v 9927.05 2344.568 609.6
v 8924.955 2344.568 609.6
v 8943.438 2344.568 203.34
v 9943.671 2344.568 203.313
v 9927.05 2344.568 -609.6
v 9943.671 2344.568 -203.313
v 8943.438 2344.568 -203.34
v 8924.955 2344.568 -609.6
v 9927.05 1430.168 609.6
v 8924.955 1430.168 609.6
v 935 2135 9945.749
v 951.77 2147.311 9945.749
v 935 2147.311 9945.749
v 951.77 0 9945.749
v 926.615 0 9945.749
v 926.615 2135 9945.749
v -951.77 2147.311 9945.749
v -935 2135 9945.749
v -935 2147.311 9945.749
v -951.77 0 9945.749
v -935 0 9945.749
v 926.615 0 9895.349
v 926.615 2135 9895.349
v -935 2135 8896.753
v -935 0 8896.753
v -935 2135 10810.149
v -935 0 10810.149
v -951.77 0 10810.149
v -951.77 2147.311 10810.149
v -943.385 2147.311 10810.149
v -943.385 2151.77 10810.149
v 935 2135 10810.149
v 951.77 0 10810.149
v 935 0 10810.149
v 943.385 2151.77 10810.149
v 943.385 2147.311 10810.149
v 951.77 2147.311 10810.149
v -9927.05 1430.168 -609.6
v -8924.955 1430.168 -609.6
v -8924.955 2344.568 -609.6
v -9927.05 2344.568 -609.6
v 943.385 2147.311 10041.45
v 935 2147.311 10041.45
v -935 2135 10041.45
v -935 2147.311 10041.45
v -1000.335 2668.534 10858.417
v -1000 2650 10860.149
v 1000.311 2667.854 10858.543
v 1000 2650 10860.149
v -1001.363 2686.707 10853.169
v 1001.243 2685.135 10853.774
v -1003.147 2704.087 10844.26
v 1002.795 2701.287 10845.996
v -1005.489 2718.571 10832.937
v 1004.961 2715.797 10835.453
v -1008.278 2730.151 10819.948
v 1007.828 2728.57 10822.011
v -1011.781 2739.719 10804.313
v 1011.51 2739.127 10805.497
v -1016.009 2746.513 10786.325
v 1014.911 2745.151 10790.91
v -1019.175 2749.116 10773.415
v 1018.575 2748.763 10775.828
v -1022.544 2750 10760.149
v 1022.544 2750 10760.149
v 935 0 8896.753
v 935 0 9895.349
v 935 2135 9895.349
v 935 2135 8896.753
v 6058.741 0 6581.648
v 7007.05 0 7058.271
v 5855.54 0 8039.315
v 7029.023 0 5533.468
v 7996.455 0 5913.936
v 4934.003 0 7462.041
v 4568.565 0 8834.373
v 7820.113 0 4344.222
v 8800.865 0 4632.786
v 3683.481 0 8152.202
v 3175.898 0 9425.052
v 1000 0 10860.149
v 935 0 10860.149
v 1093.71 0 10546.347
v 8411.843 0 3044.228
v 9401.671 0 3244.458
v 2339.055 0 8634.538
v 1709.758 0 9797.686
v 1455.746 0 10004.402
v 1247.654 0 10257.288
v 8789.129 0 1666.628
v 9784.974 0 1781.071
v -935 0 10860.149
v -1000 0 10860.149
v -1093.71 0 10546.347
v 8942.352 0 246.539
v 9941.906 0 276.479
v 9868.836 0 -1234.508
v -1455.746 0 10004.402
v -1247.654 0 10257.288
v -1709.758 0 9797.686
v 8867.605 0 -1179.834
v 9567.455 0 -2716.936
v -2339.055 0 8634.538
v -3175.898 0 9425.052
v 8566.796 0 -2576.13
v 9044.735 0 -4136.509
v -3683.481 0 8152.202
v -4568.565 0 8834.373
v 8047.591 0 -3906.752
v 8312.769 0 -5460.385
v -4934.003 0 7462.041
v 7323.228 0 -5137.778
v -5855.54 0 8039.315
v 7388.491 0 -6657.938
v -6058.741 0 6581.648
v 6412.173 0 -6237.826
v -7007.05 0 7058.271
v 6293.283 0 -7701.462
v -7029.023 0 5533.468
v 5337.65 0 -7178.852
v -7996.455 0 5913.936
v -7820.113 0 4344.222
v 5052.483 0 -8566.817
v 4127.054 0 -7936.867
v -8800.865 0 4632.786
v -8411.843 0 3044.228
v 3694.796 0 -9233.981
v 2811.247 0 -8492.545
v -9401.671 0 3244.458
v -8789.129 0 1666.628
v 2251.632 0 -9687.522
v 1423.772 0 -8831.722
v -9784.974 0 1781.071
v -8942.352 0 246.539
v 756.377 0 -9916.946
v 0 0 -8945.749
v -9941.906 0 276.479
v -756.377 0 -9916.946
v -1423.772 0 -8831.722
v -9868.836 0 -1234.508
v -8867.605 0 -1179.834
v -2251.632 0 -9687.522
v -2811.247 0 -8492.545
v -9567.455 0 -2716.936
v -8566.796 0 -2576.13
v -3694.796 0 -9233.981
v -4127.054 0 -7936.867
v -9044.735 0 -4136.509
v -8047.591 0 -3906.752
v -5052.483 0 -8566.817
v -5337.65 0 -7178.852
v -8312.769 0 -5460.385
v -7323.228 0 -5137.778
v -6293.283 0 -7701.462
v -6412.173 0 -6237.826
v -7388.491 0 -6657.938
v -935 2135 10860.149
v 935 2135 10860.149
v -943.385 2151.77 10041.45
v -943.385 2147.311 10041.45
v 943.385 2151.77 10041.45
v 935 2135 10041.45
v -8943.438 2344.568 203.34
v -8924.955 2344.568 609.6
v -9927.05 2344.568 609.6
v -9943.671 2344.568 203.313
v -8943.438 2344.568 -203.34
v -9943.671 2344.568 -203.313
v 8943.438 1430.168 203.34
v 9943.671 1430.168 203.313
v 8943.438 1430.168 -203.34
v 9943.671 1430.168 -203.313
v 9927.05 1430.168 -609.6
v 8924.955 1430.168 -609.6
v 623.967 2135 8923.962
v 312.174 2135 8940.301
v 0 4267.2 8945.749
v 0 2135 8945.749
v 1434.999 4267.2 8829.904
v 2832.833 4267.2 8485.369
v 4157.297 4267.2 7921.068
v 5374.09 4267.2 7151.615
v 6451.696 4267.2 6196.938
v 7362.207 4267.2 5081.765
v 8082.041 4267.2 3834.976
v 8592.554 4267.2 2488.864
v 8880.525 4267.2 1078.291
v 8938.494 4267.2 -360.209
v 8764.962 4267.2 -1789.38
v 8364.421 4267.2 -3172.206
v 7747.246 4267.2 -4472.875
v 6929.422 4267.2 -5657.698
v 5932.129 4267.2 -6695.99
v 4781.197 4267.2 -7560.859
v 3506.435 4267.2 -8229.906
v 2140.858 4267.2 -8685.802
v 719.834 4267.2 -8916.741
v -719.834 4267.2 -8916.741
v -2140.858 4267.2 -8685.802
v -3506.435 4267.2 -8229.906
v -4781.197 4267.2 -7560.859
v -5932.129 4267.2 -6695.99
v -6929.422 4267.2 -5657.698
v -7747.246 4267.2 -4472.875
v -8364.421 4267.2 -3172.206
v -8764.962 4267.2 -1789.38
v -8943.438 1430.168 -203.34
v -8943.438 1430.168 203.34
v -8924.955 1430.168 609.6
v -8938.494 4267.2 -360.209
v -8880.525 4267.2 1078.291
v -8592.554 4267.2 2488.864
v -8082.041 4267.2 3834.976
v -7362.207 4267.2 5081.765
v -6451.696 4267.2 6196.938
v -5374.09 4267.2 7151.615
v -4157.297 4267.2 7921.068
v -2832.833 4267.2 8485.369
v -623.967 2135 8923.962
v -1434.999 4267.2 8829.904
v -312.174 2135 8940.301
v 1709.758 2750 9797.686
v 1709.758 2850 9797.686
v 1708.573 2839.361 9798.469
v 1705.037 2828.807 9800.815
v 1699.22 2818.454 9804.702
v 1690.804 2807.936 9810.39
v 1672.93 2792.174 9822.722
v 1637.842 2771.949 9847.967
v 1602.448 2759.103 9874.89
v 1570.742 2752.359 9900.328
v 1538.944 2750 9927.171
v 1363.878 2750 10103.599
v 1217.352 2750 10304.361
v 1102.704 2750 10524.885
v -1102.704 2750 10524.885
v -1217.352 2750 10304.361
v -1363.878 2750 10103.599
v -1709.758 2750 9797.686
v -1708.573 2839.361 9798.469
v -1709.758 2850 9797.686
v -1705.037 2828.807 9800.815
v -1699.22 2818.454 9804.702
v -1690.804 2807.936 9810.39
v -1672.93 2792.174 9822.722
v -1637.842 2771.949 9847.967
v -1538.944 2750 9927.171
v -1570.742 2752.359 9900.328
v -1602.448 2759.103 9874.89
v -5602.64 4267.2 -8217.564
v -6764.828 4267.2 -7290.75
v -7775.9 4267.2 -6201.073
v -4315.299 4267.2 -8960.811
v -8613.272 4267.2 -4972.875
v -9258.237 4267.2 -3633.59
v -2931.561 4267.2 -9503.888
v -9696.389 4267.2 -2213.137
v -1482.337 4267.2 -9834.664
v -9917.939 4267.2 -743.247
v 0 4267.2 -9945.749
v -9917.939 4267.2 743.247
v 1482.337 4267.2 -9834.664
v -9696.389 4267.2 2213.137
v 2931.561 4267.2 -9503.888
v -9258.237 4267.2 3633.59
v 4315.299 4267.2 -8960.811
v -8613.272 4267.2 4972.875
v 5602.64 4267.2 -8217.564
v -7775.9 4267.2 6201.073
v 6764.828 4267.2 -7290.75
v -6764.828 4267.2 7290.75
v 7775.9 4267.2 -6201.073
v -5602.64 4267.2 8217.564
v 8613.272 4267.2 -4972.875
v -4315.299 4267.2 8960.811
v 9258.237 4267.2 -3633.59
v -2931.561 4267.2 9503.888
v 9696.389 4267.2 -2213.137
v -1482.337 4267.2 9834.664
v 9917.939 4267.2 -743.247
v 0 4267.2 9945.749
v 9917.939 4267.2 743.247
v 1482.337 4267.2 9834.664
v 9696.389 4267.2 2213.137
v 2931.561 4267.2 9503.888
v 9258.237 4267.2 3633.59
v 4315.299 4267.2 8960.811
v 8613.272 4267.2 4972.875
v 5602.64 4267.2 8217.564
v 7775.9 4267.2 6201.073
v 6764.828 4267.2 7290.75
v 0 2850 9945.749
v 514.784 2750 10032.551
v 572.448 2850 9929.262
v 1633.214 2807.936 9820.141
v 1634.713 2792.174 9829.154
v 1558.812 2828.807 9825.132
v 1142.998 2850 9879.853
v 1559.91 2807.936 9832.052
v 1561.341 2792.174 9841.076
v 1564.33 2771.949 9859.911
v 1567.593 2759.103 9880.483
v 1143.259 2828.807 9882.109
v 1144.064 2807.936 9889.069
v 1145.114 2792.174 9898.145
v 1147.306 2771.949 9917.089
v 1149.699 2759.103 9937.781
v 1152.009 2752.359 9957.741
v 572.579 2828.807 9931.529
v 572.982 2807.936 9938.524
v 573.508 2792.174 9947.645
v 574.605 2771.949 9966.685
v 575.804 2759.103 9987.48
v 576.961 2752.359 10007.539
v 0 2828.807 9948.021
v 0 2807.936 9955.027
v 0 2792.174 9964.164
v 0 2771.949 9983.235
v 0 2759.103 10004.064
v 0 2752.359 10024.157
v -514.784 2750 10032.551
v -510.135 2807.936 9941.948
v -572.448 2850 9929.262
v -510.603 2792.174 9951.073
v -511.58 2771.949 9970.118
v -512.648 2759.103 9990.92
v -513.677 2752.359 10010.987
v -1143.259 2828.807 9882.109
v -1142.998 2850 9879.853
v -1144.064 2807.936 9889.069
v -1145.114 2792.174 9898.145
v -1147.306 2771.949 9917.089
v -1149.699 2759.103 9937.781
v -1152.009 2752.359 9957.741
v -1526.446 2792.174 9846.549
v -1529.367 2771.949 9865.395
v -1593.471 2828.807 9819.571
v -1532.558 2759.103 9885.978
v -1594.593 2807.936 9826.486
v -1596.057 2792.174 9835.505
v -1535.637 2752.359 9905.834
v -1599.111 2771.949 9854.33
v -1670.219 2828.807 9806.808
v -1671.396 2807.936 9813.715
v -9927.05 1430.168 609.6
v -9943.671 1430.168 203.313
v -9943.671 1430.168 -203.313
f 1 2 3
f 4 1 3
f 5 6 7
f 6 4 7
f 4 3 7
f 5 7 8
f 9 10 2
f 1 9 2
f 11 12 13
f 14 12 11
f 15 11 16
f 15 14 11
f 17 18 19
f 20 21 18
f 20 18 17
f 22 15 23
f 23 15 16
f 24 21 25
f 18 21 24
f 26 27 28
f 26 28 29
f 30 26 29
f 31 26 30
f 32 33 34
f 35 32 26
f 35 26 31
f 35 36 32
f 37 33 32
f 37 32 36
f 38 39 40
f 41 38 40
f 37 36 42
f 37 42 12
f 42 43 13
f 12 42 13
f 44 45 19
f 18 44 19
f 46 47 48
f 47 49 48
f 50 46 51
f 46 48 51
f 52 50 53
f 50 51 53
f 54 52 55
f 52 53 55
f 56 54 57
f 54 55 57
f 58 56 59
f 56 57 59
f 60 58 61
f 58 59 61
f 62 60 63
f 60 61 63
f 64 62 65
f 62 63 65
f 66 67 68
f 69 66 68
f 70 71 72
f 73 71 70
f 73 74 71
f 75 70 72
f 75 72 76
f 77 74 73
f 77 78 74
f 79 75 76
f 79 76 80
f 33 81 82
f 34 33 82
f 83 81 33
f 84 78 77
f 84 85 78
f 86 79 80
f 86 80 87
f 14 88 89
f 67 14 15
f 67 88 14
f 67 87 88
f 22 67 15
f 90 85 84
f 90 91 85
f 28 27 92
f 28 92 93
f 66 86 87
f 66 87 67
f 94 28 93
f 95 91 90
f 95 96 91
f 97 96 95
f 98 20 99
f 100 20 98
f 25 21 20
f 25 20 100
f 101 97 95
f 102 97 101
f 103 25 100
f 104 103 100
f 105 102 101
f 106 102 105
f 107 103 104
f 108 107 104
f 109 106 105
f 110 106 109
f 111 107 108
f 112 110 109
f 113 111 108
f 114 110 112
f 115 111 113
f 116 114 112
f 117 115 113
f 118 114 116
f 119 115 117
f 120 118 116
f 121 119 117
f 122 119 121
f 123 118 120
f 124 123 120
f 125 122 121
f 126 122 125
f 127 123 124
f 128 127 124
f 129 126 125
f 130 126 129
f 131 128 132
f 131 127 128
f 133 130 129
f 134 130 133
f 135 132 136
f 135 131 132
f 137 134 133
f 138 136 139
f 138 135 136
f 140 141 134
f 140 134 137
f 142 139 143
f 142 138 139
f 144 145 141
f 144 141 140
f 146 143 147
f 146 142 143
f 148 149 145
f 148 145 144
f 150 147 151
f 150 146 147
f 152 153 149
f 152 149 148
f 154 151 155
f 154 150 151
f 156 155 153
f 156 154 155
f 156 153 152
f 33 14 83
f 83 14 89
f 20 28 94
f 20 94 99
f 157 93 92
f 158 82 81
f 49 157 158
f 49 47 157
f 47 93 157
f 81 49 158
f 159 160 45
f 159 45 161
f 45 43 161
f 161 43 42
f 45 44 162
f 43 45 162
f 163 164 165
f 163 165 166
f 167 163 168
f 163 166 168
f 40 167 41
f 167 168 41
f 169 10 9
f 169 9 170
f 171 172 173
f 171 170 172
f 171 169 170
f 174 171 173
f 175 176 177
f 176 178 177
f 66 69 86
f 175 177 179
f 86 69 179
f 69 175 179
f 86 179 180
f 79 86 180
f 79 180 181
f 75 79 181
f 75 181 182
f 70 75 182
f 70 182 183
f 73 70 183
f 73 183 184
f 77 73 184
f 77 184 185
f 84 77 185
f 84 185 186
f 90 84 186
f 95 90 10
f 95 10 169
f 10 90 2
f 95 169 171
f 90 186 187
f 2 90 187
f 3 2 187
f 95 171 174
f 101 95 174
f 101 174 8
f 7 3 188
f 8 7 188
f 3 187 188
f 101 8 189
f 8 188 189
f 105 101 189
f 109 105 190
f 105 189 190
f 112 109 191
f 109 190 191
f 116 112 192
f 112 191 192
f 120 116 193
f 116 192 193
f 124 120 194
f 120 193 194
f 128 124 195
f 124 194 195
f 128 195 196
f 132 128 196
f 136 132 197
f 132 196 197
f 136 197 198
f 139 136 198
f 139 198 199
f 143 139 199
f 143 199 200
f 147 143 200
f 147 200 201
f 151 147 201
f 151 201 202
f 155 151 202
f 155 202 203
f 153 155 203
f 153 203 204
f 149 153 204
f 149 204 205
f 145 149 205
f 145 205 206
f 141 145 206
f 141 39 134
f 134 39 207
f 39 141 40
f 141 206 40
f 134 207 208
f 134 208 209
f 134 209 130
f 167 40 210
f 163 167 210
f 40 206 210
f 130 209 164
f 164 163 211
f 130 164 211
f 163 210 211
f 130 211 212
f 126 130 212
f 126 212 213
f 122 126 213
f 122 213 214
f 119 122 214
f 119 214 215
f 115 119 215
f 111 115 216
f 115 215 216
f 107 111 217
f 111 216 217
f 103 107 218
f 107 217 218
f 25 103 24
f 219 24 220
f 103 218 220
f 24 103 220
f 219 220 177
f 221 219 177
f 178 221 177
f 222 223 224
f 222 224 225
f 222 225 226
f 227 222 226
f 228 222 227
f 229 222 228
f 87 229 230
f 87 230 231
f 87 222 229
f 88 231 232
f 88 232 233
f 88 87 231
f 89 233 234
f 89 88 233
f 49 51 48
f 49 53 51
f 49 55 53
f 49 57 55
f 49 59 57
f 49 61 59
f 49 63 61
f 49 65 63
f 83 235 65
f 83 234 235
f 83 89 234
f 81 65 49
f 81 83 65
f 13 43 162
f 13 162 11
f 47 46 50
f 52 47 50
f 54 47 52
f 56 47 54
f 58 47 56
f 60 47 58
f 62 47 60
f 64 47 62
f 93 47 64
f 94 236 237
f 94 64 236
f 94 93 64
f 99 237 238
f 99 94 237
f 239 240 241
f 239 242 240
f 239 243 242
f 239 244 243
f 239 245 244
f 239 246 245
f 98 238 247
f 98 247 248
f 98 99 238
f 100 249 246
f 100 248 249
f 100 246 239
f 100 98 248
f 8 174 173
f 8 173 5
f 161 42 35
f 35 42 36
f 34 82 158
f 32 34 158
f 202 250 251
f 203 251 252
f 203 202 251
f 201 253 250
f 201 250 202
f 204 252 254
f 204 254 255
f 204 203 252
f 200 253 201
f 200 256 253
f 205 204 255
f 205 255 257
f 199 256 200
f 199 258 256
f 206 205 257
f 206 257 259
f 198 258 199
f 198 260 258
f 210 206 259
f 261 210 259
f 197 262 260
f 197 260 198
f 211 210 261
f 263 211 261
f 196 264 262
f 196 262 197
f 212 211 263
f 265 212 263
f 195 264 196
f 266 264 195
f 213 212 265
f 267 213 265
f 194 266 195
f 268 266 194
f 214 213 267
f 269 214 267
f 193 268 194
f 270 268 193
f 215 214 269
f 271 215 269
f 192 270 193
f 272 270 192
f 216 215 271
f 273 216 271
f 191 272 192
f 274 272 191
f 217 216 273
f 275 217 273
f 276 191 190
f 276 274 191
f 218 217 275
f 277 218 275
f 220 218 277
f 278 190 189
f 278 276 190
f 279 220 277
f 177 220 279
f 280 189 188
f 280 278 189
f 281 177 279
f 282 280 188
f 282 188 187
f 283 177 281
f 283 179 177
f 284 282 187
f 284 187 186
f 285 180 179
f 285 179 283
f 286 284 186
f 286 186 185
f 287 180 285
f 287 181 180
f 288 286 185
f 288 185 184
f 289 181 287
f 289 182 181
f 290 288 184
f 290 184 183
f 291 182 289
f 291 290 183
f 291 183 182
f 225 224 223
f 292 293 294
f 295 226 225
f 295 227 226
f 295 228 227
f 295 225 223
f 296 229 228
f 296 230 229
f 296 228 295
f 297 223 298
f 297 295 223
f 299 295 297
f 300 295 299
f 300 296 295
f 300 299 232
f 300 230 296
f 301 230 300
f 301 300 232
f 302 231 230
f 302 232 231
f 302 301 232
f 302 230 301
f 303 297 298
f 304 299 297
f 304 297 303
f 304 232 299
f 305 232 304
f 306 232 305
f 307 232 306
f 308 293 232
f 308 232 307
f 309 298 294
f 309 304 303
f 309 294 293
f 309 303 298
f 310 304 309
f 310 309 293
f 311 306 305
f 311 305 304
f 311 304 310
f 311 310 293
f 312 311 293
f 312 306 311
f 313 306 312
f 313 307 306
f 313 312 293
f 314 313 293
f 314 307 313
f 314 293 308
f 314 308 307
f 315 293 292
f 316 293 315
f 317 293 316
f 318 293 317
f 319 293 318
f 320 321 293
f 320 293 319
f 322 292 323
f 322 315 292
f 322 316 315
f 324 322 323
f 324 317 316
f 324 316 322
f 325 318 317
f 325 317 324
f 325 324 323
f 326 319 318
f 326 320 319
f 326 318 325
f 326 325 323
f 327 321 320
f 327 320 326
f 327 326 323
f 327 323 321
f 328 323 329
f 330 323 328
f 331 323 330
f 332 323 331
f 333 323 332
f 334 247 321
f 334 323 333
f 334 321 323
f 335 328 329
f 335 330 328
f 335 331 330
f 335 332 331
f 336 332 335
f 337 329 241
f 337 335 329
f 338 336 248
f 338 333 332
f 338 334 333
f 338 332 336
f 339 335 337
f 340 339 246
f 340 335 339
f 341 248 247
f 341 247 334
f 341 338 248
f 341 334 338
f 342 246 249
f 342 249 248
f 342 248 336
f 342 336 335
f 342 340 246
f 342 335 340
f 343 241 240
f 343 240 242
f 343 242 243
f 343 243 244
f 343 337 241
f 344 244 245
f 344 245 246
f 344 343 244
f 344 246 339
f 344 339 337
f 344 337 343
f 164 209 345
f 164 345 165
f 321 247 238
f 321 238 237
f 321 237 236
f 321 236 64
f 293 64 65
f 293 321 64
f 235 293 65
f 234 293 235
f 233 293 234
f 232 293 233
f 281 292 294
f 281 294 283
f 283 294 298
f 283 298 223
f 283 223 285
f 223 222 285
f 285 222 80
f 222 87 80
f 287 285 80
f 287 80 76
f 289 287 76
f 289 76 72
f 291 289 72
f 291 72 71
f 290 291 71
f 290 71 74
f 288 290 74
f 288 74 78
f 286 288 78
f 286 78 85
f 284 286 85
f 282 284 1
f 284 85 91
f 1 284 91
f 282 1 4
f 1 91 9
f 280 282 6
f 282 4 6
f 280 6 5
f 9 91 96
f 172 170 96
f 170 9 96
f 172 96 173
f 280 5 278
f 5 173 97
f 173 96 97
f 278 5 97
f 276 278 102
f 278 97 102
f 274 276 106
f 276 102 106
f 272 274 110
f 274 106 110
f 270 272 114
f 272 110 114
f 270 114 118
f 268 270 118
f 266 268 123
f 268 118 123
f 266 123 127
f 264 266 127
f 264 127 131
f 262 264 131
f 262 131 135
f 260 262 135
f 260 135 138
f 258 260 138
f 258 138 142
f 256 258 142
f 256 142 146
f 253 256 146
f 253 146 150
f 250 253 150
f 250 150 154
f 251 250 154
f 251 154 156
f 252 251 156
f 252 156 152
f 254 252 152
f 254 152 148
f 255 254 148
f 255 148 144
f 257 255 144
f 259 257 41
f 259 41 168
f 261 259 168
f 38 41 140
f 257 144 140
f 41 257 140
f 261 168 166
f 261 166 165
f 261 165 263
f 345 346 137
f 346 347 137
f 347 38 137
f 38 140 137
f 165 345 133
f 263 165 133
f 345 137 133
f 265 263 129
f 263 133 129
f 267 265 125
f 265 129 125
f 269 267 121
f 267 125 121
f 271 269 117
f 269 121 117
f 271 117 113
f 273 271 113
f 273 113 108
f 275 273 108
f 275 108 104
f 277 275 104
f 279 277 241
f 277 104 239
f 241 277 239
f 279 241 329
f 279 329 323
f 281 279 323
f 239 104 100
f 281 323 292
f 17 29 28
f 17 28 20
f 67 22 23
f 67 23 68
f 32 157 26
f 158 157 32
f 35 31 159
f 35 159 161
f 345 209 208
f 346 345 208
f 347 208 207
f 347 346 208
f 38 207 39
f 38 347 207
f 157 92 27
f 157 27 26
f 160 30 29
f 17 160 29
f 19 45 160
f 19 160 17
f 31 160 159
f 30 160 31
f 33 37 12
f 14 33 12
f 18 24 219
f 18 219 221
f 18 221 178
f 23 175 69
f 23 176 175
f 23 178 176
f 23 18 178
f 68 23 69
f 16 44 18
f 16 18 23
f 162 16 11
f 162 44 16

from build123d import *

# Parameters (mm, degrees)
SKETCH1_R               = 9945.749426531
BOSS_EXTRUDE1_DEPTH     = 4267.2
SKETCH2_R               = 8945.749426531
CUT_EXTRUDE1_DEPTH      = 4267.2
SKETCH4_W               = 2000
SKETCH4_H               = 2750
BOSS_EXTRUDE2_DEPTH     = 914.4
SKETCH5_W               = 1870
SKETCH5_H               = 2135
CUT_EXTRUDE2_DEPTH      = 2500
SKETCH6_W               = 864.4
SKETCH6_H               = 2222.798404513
CUT_EXTRUDE3_DEPTH      = 16.77
SKETCH7_W               = 1886.77
SKETCH7_H               = 768.69921335
CUT_EXTRUDE4_DEPTH      = 16.77
BOSS_EXTRUDE3_REACH     = 15333.985
SKETCH9_W               = 1861.615
SKETCH9_H               = 2276.741712896
CUT_EXTRUDE5_DEPTH      = 4000
CUT_EXTRUDE6_DEPTH      = 15332.985294212
CUT_EXTRUDE6_DEPTH_BACK = 15332.985294212
SKETCH10_W              = 1219.2
SKETCH10_H              = 914.4
FILLET1_R               = 100


with BuildPart() as part:
    # Sketch1 → Boss-Extrude1 (new body)
    with BuildSketch(Plane(origin=(0, 0, 0), x_dir=(1, 0, 0), z_dir=(0, 1, 0))):
        with Locations(Location((0, 0, 0), (0, 0, 270))):
            Circle(SKETCH1_R)
    extrude(amount=BOSS_EXTRUDE1_DEPTH)

    # Sketch2 → Cut-Extrude1 (cut)
    with BuildSketch(Plane(origin=(0, 4267.2, 0), x_dir=(1, 0, 0), z_dir=(0, 1, 0))):
        with Locations(Location((0, 0, 0), (0, 0, 270))):
            Circle(SKETCH2_R)
    extrude(amount=-CUT_EXTRUDE1_DEPTH, mode=Mode.SUBTRACT)


with BuildPart() as body_2:
    # Sketch4 → Boss-Extrude2 (new body)
    with BuildSketch(Plane.XY.offset(9945.749426531)):
        with Locations((0, 1375)):
            Rectangle(SKETCH4_W, SKETCH4_H)
    extrude(amount=BOSS_EXTRUDE2_DEPTH)


with BuildPart() as cut_extrude2_tool:
    # Sketch5 → Cut-Extrude2 (new, symmetric)
    with BuildSketch(Plane.XY.offset(10860.149426531)):
        with Locations((0, 1067.5)):
            Rectangle(SKETCH5_W, SKETCH5_H)
    extrude(amount=CUT_EXTRUDE2_DEPTH, both=True)


with BuildPart() as part_1:
    add(part.part)

    # Cut-Extrude2: cut by cut_extrude2_tool
    add(cut_extrude2_tool.part, mode=Mode.SUBTRACT)


with BuildPart() as body_2_1:
    add(body_2.part)

    # Cut-Extrude2: cut by cut_extrude2_tool
    add(cut_extrude2_tool.part, mode=Mode.SUBTRACT)

    # Sketch6 → Cut-Extrude3 (cut)
    with BuildSketch(Plane(origin=(-935, 0, 0), x_dir=(0, 0, -1), z_dir=(1, 0, 0))):
        with Locations((-10377.949426531, 1035.912288571)):
            Rectangle(SKETCH6_W, SKETCH6_H)
    cut_extrude3 = extrude(amount=-CUT_EXTRUDE3_DEPTH, mode=Mode.SUBTRACT)

    # Mirror1: Cut-Extrude3 across plane
    add(cut_extrude3.mirror(Plane(origin=(0, 0, 0), x_dir=(0, 0, 1), z_dir=(1, 0, 0))), mode=Mode.SUBTRACT)

    # Sketch7 → Cut-Extrude4 (cut)
    with BuildSketch(Plane.XZ.offset(-2135)):
        with Locations((0, 10425.799819856)):
            Rectangle(SKETCH7_W, SKETCH7_H)
    extrude(amount=-CUT_EXTRUDE4_DEPTH, mode=Mode.SUBTRACT)

    # Boss-Extrude3: up to this face of the body (flat: up to its plane)
    boss_extrude3_end = Plane(body_2_1.part.faces().sort_by_distance((0, 2750, 10402.949426531))[0])
    # Sketch8 → Boss-Extrude3 (add, up to the picked face)
    with BuildSketch(Plane(origin=(0, 0, 0), x_dir=(1, 0, 0), z_dir=(0, 1, 0)), mode=Mode.PRIVATE) as boss_extrude3_sk1:
        with BuildLine():
            Line((-1000, -9945.749426531), (-1000, -10860.149426531))
            ThreePointArc((-1000, -10860.149426531), (-1247.653940118, -10257.288387991), (-1709.757794535, -9797.686458515))
            ThreePointArc((-1709.757794535, -9797.686458515), (-1355.758576896, -9852.910754519), (-1000, -9895.348991084))
            Line((-1000, -9895.348991084), (1000, -9895.348991084))
            ThreePointArc((1000, -9895.348991084), (1355.758576896, -9852.910754519), (1709.757794535, -9797.686458515))
            ThreePointArc((1709.757794535, -9797.686458515), (1247.653940118, -10257.288387991), (1000, -10860.149426531))
            Line((1000, -10860.149426531), (1000, -9945.749426531))
            Line((1000, -9945.749426531), (-1000, -9945.749426531))
        make_face()
    boss_extrude3_tool1 = split(extrude(boss_extrude3_sk1.sketch, amount=BOSS_EXTRUDE3_REACH, mode=Mode.PRIVATE), bisect_by=boss_extrude3_end, keep=Keep.BOTH, mode=Mode.PRIVATE)

    add(part_1.part)  # Boss-Extrude3 merges part
    add(boss_extrude3_tool1.solids().sort_by(Axis((1035.807701, 0, 10402.949427), (0, 1, 0)))[0])

    # Sketch9 → Cut-Extrude5 (cut)
    with BuildSketch(Plane.XY.offset(9945.749426531)):
        with Locations((-4.1925, 996.629143552)):
            Rectangle(SKETCH9_W, SKETCH9_H)
    extrude(amount=-CUT_EXTRUDE5_DEPTH, mode=Mode.SUBTRACT)

    # Sketch10 → Cut-Extrude6 (cut, two sides: drawn at the far end of the back side and taken through both)
    with BuildSketch(Plane(origin=(0, 0, 0), x_dir=(0, 0, -1), z_dir=(1, 0, 0)).offset(-CUT_EXTRUDE6_DEPTH_BACK)):
        with Locations((0, 1887.367931643)):
            Rectangle(SKETCH10_W, SKETCH10_H)
    extrude(amount=CUT_EXTRUDE6_DEPTH + CUT_EXTRUDE6_DEPTH_BACK, mode=Mode.SUBTRACT)

    # Fillet1
    fillet1_edges = [body_2_1.edges().sort_by_distance(p)[0] for p in [
        (858.078428593, 2750, 9908.664545019),
        (0, 2750, 10860.149426531),
    ]]
    fillet(fillet1_edges, radius=FILLET1_R)


solid = body_2_1.part
